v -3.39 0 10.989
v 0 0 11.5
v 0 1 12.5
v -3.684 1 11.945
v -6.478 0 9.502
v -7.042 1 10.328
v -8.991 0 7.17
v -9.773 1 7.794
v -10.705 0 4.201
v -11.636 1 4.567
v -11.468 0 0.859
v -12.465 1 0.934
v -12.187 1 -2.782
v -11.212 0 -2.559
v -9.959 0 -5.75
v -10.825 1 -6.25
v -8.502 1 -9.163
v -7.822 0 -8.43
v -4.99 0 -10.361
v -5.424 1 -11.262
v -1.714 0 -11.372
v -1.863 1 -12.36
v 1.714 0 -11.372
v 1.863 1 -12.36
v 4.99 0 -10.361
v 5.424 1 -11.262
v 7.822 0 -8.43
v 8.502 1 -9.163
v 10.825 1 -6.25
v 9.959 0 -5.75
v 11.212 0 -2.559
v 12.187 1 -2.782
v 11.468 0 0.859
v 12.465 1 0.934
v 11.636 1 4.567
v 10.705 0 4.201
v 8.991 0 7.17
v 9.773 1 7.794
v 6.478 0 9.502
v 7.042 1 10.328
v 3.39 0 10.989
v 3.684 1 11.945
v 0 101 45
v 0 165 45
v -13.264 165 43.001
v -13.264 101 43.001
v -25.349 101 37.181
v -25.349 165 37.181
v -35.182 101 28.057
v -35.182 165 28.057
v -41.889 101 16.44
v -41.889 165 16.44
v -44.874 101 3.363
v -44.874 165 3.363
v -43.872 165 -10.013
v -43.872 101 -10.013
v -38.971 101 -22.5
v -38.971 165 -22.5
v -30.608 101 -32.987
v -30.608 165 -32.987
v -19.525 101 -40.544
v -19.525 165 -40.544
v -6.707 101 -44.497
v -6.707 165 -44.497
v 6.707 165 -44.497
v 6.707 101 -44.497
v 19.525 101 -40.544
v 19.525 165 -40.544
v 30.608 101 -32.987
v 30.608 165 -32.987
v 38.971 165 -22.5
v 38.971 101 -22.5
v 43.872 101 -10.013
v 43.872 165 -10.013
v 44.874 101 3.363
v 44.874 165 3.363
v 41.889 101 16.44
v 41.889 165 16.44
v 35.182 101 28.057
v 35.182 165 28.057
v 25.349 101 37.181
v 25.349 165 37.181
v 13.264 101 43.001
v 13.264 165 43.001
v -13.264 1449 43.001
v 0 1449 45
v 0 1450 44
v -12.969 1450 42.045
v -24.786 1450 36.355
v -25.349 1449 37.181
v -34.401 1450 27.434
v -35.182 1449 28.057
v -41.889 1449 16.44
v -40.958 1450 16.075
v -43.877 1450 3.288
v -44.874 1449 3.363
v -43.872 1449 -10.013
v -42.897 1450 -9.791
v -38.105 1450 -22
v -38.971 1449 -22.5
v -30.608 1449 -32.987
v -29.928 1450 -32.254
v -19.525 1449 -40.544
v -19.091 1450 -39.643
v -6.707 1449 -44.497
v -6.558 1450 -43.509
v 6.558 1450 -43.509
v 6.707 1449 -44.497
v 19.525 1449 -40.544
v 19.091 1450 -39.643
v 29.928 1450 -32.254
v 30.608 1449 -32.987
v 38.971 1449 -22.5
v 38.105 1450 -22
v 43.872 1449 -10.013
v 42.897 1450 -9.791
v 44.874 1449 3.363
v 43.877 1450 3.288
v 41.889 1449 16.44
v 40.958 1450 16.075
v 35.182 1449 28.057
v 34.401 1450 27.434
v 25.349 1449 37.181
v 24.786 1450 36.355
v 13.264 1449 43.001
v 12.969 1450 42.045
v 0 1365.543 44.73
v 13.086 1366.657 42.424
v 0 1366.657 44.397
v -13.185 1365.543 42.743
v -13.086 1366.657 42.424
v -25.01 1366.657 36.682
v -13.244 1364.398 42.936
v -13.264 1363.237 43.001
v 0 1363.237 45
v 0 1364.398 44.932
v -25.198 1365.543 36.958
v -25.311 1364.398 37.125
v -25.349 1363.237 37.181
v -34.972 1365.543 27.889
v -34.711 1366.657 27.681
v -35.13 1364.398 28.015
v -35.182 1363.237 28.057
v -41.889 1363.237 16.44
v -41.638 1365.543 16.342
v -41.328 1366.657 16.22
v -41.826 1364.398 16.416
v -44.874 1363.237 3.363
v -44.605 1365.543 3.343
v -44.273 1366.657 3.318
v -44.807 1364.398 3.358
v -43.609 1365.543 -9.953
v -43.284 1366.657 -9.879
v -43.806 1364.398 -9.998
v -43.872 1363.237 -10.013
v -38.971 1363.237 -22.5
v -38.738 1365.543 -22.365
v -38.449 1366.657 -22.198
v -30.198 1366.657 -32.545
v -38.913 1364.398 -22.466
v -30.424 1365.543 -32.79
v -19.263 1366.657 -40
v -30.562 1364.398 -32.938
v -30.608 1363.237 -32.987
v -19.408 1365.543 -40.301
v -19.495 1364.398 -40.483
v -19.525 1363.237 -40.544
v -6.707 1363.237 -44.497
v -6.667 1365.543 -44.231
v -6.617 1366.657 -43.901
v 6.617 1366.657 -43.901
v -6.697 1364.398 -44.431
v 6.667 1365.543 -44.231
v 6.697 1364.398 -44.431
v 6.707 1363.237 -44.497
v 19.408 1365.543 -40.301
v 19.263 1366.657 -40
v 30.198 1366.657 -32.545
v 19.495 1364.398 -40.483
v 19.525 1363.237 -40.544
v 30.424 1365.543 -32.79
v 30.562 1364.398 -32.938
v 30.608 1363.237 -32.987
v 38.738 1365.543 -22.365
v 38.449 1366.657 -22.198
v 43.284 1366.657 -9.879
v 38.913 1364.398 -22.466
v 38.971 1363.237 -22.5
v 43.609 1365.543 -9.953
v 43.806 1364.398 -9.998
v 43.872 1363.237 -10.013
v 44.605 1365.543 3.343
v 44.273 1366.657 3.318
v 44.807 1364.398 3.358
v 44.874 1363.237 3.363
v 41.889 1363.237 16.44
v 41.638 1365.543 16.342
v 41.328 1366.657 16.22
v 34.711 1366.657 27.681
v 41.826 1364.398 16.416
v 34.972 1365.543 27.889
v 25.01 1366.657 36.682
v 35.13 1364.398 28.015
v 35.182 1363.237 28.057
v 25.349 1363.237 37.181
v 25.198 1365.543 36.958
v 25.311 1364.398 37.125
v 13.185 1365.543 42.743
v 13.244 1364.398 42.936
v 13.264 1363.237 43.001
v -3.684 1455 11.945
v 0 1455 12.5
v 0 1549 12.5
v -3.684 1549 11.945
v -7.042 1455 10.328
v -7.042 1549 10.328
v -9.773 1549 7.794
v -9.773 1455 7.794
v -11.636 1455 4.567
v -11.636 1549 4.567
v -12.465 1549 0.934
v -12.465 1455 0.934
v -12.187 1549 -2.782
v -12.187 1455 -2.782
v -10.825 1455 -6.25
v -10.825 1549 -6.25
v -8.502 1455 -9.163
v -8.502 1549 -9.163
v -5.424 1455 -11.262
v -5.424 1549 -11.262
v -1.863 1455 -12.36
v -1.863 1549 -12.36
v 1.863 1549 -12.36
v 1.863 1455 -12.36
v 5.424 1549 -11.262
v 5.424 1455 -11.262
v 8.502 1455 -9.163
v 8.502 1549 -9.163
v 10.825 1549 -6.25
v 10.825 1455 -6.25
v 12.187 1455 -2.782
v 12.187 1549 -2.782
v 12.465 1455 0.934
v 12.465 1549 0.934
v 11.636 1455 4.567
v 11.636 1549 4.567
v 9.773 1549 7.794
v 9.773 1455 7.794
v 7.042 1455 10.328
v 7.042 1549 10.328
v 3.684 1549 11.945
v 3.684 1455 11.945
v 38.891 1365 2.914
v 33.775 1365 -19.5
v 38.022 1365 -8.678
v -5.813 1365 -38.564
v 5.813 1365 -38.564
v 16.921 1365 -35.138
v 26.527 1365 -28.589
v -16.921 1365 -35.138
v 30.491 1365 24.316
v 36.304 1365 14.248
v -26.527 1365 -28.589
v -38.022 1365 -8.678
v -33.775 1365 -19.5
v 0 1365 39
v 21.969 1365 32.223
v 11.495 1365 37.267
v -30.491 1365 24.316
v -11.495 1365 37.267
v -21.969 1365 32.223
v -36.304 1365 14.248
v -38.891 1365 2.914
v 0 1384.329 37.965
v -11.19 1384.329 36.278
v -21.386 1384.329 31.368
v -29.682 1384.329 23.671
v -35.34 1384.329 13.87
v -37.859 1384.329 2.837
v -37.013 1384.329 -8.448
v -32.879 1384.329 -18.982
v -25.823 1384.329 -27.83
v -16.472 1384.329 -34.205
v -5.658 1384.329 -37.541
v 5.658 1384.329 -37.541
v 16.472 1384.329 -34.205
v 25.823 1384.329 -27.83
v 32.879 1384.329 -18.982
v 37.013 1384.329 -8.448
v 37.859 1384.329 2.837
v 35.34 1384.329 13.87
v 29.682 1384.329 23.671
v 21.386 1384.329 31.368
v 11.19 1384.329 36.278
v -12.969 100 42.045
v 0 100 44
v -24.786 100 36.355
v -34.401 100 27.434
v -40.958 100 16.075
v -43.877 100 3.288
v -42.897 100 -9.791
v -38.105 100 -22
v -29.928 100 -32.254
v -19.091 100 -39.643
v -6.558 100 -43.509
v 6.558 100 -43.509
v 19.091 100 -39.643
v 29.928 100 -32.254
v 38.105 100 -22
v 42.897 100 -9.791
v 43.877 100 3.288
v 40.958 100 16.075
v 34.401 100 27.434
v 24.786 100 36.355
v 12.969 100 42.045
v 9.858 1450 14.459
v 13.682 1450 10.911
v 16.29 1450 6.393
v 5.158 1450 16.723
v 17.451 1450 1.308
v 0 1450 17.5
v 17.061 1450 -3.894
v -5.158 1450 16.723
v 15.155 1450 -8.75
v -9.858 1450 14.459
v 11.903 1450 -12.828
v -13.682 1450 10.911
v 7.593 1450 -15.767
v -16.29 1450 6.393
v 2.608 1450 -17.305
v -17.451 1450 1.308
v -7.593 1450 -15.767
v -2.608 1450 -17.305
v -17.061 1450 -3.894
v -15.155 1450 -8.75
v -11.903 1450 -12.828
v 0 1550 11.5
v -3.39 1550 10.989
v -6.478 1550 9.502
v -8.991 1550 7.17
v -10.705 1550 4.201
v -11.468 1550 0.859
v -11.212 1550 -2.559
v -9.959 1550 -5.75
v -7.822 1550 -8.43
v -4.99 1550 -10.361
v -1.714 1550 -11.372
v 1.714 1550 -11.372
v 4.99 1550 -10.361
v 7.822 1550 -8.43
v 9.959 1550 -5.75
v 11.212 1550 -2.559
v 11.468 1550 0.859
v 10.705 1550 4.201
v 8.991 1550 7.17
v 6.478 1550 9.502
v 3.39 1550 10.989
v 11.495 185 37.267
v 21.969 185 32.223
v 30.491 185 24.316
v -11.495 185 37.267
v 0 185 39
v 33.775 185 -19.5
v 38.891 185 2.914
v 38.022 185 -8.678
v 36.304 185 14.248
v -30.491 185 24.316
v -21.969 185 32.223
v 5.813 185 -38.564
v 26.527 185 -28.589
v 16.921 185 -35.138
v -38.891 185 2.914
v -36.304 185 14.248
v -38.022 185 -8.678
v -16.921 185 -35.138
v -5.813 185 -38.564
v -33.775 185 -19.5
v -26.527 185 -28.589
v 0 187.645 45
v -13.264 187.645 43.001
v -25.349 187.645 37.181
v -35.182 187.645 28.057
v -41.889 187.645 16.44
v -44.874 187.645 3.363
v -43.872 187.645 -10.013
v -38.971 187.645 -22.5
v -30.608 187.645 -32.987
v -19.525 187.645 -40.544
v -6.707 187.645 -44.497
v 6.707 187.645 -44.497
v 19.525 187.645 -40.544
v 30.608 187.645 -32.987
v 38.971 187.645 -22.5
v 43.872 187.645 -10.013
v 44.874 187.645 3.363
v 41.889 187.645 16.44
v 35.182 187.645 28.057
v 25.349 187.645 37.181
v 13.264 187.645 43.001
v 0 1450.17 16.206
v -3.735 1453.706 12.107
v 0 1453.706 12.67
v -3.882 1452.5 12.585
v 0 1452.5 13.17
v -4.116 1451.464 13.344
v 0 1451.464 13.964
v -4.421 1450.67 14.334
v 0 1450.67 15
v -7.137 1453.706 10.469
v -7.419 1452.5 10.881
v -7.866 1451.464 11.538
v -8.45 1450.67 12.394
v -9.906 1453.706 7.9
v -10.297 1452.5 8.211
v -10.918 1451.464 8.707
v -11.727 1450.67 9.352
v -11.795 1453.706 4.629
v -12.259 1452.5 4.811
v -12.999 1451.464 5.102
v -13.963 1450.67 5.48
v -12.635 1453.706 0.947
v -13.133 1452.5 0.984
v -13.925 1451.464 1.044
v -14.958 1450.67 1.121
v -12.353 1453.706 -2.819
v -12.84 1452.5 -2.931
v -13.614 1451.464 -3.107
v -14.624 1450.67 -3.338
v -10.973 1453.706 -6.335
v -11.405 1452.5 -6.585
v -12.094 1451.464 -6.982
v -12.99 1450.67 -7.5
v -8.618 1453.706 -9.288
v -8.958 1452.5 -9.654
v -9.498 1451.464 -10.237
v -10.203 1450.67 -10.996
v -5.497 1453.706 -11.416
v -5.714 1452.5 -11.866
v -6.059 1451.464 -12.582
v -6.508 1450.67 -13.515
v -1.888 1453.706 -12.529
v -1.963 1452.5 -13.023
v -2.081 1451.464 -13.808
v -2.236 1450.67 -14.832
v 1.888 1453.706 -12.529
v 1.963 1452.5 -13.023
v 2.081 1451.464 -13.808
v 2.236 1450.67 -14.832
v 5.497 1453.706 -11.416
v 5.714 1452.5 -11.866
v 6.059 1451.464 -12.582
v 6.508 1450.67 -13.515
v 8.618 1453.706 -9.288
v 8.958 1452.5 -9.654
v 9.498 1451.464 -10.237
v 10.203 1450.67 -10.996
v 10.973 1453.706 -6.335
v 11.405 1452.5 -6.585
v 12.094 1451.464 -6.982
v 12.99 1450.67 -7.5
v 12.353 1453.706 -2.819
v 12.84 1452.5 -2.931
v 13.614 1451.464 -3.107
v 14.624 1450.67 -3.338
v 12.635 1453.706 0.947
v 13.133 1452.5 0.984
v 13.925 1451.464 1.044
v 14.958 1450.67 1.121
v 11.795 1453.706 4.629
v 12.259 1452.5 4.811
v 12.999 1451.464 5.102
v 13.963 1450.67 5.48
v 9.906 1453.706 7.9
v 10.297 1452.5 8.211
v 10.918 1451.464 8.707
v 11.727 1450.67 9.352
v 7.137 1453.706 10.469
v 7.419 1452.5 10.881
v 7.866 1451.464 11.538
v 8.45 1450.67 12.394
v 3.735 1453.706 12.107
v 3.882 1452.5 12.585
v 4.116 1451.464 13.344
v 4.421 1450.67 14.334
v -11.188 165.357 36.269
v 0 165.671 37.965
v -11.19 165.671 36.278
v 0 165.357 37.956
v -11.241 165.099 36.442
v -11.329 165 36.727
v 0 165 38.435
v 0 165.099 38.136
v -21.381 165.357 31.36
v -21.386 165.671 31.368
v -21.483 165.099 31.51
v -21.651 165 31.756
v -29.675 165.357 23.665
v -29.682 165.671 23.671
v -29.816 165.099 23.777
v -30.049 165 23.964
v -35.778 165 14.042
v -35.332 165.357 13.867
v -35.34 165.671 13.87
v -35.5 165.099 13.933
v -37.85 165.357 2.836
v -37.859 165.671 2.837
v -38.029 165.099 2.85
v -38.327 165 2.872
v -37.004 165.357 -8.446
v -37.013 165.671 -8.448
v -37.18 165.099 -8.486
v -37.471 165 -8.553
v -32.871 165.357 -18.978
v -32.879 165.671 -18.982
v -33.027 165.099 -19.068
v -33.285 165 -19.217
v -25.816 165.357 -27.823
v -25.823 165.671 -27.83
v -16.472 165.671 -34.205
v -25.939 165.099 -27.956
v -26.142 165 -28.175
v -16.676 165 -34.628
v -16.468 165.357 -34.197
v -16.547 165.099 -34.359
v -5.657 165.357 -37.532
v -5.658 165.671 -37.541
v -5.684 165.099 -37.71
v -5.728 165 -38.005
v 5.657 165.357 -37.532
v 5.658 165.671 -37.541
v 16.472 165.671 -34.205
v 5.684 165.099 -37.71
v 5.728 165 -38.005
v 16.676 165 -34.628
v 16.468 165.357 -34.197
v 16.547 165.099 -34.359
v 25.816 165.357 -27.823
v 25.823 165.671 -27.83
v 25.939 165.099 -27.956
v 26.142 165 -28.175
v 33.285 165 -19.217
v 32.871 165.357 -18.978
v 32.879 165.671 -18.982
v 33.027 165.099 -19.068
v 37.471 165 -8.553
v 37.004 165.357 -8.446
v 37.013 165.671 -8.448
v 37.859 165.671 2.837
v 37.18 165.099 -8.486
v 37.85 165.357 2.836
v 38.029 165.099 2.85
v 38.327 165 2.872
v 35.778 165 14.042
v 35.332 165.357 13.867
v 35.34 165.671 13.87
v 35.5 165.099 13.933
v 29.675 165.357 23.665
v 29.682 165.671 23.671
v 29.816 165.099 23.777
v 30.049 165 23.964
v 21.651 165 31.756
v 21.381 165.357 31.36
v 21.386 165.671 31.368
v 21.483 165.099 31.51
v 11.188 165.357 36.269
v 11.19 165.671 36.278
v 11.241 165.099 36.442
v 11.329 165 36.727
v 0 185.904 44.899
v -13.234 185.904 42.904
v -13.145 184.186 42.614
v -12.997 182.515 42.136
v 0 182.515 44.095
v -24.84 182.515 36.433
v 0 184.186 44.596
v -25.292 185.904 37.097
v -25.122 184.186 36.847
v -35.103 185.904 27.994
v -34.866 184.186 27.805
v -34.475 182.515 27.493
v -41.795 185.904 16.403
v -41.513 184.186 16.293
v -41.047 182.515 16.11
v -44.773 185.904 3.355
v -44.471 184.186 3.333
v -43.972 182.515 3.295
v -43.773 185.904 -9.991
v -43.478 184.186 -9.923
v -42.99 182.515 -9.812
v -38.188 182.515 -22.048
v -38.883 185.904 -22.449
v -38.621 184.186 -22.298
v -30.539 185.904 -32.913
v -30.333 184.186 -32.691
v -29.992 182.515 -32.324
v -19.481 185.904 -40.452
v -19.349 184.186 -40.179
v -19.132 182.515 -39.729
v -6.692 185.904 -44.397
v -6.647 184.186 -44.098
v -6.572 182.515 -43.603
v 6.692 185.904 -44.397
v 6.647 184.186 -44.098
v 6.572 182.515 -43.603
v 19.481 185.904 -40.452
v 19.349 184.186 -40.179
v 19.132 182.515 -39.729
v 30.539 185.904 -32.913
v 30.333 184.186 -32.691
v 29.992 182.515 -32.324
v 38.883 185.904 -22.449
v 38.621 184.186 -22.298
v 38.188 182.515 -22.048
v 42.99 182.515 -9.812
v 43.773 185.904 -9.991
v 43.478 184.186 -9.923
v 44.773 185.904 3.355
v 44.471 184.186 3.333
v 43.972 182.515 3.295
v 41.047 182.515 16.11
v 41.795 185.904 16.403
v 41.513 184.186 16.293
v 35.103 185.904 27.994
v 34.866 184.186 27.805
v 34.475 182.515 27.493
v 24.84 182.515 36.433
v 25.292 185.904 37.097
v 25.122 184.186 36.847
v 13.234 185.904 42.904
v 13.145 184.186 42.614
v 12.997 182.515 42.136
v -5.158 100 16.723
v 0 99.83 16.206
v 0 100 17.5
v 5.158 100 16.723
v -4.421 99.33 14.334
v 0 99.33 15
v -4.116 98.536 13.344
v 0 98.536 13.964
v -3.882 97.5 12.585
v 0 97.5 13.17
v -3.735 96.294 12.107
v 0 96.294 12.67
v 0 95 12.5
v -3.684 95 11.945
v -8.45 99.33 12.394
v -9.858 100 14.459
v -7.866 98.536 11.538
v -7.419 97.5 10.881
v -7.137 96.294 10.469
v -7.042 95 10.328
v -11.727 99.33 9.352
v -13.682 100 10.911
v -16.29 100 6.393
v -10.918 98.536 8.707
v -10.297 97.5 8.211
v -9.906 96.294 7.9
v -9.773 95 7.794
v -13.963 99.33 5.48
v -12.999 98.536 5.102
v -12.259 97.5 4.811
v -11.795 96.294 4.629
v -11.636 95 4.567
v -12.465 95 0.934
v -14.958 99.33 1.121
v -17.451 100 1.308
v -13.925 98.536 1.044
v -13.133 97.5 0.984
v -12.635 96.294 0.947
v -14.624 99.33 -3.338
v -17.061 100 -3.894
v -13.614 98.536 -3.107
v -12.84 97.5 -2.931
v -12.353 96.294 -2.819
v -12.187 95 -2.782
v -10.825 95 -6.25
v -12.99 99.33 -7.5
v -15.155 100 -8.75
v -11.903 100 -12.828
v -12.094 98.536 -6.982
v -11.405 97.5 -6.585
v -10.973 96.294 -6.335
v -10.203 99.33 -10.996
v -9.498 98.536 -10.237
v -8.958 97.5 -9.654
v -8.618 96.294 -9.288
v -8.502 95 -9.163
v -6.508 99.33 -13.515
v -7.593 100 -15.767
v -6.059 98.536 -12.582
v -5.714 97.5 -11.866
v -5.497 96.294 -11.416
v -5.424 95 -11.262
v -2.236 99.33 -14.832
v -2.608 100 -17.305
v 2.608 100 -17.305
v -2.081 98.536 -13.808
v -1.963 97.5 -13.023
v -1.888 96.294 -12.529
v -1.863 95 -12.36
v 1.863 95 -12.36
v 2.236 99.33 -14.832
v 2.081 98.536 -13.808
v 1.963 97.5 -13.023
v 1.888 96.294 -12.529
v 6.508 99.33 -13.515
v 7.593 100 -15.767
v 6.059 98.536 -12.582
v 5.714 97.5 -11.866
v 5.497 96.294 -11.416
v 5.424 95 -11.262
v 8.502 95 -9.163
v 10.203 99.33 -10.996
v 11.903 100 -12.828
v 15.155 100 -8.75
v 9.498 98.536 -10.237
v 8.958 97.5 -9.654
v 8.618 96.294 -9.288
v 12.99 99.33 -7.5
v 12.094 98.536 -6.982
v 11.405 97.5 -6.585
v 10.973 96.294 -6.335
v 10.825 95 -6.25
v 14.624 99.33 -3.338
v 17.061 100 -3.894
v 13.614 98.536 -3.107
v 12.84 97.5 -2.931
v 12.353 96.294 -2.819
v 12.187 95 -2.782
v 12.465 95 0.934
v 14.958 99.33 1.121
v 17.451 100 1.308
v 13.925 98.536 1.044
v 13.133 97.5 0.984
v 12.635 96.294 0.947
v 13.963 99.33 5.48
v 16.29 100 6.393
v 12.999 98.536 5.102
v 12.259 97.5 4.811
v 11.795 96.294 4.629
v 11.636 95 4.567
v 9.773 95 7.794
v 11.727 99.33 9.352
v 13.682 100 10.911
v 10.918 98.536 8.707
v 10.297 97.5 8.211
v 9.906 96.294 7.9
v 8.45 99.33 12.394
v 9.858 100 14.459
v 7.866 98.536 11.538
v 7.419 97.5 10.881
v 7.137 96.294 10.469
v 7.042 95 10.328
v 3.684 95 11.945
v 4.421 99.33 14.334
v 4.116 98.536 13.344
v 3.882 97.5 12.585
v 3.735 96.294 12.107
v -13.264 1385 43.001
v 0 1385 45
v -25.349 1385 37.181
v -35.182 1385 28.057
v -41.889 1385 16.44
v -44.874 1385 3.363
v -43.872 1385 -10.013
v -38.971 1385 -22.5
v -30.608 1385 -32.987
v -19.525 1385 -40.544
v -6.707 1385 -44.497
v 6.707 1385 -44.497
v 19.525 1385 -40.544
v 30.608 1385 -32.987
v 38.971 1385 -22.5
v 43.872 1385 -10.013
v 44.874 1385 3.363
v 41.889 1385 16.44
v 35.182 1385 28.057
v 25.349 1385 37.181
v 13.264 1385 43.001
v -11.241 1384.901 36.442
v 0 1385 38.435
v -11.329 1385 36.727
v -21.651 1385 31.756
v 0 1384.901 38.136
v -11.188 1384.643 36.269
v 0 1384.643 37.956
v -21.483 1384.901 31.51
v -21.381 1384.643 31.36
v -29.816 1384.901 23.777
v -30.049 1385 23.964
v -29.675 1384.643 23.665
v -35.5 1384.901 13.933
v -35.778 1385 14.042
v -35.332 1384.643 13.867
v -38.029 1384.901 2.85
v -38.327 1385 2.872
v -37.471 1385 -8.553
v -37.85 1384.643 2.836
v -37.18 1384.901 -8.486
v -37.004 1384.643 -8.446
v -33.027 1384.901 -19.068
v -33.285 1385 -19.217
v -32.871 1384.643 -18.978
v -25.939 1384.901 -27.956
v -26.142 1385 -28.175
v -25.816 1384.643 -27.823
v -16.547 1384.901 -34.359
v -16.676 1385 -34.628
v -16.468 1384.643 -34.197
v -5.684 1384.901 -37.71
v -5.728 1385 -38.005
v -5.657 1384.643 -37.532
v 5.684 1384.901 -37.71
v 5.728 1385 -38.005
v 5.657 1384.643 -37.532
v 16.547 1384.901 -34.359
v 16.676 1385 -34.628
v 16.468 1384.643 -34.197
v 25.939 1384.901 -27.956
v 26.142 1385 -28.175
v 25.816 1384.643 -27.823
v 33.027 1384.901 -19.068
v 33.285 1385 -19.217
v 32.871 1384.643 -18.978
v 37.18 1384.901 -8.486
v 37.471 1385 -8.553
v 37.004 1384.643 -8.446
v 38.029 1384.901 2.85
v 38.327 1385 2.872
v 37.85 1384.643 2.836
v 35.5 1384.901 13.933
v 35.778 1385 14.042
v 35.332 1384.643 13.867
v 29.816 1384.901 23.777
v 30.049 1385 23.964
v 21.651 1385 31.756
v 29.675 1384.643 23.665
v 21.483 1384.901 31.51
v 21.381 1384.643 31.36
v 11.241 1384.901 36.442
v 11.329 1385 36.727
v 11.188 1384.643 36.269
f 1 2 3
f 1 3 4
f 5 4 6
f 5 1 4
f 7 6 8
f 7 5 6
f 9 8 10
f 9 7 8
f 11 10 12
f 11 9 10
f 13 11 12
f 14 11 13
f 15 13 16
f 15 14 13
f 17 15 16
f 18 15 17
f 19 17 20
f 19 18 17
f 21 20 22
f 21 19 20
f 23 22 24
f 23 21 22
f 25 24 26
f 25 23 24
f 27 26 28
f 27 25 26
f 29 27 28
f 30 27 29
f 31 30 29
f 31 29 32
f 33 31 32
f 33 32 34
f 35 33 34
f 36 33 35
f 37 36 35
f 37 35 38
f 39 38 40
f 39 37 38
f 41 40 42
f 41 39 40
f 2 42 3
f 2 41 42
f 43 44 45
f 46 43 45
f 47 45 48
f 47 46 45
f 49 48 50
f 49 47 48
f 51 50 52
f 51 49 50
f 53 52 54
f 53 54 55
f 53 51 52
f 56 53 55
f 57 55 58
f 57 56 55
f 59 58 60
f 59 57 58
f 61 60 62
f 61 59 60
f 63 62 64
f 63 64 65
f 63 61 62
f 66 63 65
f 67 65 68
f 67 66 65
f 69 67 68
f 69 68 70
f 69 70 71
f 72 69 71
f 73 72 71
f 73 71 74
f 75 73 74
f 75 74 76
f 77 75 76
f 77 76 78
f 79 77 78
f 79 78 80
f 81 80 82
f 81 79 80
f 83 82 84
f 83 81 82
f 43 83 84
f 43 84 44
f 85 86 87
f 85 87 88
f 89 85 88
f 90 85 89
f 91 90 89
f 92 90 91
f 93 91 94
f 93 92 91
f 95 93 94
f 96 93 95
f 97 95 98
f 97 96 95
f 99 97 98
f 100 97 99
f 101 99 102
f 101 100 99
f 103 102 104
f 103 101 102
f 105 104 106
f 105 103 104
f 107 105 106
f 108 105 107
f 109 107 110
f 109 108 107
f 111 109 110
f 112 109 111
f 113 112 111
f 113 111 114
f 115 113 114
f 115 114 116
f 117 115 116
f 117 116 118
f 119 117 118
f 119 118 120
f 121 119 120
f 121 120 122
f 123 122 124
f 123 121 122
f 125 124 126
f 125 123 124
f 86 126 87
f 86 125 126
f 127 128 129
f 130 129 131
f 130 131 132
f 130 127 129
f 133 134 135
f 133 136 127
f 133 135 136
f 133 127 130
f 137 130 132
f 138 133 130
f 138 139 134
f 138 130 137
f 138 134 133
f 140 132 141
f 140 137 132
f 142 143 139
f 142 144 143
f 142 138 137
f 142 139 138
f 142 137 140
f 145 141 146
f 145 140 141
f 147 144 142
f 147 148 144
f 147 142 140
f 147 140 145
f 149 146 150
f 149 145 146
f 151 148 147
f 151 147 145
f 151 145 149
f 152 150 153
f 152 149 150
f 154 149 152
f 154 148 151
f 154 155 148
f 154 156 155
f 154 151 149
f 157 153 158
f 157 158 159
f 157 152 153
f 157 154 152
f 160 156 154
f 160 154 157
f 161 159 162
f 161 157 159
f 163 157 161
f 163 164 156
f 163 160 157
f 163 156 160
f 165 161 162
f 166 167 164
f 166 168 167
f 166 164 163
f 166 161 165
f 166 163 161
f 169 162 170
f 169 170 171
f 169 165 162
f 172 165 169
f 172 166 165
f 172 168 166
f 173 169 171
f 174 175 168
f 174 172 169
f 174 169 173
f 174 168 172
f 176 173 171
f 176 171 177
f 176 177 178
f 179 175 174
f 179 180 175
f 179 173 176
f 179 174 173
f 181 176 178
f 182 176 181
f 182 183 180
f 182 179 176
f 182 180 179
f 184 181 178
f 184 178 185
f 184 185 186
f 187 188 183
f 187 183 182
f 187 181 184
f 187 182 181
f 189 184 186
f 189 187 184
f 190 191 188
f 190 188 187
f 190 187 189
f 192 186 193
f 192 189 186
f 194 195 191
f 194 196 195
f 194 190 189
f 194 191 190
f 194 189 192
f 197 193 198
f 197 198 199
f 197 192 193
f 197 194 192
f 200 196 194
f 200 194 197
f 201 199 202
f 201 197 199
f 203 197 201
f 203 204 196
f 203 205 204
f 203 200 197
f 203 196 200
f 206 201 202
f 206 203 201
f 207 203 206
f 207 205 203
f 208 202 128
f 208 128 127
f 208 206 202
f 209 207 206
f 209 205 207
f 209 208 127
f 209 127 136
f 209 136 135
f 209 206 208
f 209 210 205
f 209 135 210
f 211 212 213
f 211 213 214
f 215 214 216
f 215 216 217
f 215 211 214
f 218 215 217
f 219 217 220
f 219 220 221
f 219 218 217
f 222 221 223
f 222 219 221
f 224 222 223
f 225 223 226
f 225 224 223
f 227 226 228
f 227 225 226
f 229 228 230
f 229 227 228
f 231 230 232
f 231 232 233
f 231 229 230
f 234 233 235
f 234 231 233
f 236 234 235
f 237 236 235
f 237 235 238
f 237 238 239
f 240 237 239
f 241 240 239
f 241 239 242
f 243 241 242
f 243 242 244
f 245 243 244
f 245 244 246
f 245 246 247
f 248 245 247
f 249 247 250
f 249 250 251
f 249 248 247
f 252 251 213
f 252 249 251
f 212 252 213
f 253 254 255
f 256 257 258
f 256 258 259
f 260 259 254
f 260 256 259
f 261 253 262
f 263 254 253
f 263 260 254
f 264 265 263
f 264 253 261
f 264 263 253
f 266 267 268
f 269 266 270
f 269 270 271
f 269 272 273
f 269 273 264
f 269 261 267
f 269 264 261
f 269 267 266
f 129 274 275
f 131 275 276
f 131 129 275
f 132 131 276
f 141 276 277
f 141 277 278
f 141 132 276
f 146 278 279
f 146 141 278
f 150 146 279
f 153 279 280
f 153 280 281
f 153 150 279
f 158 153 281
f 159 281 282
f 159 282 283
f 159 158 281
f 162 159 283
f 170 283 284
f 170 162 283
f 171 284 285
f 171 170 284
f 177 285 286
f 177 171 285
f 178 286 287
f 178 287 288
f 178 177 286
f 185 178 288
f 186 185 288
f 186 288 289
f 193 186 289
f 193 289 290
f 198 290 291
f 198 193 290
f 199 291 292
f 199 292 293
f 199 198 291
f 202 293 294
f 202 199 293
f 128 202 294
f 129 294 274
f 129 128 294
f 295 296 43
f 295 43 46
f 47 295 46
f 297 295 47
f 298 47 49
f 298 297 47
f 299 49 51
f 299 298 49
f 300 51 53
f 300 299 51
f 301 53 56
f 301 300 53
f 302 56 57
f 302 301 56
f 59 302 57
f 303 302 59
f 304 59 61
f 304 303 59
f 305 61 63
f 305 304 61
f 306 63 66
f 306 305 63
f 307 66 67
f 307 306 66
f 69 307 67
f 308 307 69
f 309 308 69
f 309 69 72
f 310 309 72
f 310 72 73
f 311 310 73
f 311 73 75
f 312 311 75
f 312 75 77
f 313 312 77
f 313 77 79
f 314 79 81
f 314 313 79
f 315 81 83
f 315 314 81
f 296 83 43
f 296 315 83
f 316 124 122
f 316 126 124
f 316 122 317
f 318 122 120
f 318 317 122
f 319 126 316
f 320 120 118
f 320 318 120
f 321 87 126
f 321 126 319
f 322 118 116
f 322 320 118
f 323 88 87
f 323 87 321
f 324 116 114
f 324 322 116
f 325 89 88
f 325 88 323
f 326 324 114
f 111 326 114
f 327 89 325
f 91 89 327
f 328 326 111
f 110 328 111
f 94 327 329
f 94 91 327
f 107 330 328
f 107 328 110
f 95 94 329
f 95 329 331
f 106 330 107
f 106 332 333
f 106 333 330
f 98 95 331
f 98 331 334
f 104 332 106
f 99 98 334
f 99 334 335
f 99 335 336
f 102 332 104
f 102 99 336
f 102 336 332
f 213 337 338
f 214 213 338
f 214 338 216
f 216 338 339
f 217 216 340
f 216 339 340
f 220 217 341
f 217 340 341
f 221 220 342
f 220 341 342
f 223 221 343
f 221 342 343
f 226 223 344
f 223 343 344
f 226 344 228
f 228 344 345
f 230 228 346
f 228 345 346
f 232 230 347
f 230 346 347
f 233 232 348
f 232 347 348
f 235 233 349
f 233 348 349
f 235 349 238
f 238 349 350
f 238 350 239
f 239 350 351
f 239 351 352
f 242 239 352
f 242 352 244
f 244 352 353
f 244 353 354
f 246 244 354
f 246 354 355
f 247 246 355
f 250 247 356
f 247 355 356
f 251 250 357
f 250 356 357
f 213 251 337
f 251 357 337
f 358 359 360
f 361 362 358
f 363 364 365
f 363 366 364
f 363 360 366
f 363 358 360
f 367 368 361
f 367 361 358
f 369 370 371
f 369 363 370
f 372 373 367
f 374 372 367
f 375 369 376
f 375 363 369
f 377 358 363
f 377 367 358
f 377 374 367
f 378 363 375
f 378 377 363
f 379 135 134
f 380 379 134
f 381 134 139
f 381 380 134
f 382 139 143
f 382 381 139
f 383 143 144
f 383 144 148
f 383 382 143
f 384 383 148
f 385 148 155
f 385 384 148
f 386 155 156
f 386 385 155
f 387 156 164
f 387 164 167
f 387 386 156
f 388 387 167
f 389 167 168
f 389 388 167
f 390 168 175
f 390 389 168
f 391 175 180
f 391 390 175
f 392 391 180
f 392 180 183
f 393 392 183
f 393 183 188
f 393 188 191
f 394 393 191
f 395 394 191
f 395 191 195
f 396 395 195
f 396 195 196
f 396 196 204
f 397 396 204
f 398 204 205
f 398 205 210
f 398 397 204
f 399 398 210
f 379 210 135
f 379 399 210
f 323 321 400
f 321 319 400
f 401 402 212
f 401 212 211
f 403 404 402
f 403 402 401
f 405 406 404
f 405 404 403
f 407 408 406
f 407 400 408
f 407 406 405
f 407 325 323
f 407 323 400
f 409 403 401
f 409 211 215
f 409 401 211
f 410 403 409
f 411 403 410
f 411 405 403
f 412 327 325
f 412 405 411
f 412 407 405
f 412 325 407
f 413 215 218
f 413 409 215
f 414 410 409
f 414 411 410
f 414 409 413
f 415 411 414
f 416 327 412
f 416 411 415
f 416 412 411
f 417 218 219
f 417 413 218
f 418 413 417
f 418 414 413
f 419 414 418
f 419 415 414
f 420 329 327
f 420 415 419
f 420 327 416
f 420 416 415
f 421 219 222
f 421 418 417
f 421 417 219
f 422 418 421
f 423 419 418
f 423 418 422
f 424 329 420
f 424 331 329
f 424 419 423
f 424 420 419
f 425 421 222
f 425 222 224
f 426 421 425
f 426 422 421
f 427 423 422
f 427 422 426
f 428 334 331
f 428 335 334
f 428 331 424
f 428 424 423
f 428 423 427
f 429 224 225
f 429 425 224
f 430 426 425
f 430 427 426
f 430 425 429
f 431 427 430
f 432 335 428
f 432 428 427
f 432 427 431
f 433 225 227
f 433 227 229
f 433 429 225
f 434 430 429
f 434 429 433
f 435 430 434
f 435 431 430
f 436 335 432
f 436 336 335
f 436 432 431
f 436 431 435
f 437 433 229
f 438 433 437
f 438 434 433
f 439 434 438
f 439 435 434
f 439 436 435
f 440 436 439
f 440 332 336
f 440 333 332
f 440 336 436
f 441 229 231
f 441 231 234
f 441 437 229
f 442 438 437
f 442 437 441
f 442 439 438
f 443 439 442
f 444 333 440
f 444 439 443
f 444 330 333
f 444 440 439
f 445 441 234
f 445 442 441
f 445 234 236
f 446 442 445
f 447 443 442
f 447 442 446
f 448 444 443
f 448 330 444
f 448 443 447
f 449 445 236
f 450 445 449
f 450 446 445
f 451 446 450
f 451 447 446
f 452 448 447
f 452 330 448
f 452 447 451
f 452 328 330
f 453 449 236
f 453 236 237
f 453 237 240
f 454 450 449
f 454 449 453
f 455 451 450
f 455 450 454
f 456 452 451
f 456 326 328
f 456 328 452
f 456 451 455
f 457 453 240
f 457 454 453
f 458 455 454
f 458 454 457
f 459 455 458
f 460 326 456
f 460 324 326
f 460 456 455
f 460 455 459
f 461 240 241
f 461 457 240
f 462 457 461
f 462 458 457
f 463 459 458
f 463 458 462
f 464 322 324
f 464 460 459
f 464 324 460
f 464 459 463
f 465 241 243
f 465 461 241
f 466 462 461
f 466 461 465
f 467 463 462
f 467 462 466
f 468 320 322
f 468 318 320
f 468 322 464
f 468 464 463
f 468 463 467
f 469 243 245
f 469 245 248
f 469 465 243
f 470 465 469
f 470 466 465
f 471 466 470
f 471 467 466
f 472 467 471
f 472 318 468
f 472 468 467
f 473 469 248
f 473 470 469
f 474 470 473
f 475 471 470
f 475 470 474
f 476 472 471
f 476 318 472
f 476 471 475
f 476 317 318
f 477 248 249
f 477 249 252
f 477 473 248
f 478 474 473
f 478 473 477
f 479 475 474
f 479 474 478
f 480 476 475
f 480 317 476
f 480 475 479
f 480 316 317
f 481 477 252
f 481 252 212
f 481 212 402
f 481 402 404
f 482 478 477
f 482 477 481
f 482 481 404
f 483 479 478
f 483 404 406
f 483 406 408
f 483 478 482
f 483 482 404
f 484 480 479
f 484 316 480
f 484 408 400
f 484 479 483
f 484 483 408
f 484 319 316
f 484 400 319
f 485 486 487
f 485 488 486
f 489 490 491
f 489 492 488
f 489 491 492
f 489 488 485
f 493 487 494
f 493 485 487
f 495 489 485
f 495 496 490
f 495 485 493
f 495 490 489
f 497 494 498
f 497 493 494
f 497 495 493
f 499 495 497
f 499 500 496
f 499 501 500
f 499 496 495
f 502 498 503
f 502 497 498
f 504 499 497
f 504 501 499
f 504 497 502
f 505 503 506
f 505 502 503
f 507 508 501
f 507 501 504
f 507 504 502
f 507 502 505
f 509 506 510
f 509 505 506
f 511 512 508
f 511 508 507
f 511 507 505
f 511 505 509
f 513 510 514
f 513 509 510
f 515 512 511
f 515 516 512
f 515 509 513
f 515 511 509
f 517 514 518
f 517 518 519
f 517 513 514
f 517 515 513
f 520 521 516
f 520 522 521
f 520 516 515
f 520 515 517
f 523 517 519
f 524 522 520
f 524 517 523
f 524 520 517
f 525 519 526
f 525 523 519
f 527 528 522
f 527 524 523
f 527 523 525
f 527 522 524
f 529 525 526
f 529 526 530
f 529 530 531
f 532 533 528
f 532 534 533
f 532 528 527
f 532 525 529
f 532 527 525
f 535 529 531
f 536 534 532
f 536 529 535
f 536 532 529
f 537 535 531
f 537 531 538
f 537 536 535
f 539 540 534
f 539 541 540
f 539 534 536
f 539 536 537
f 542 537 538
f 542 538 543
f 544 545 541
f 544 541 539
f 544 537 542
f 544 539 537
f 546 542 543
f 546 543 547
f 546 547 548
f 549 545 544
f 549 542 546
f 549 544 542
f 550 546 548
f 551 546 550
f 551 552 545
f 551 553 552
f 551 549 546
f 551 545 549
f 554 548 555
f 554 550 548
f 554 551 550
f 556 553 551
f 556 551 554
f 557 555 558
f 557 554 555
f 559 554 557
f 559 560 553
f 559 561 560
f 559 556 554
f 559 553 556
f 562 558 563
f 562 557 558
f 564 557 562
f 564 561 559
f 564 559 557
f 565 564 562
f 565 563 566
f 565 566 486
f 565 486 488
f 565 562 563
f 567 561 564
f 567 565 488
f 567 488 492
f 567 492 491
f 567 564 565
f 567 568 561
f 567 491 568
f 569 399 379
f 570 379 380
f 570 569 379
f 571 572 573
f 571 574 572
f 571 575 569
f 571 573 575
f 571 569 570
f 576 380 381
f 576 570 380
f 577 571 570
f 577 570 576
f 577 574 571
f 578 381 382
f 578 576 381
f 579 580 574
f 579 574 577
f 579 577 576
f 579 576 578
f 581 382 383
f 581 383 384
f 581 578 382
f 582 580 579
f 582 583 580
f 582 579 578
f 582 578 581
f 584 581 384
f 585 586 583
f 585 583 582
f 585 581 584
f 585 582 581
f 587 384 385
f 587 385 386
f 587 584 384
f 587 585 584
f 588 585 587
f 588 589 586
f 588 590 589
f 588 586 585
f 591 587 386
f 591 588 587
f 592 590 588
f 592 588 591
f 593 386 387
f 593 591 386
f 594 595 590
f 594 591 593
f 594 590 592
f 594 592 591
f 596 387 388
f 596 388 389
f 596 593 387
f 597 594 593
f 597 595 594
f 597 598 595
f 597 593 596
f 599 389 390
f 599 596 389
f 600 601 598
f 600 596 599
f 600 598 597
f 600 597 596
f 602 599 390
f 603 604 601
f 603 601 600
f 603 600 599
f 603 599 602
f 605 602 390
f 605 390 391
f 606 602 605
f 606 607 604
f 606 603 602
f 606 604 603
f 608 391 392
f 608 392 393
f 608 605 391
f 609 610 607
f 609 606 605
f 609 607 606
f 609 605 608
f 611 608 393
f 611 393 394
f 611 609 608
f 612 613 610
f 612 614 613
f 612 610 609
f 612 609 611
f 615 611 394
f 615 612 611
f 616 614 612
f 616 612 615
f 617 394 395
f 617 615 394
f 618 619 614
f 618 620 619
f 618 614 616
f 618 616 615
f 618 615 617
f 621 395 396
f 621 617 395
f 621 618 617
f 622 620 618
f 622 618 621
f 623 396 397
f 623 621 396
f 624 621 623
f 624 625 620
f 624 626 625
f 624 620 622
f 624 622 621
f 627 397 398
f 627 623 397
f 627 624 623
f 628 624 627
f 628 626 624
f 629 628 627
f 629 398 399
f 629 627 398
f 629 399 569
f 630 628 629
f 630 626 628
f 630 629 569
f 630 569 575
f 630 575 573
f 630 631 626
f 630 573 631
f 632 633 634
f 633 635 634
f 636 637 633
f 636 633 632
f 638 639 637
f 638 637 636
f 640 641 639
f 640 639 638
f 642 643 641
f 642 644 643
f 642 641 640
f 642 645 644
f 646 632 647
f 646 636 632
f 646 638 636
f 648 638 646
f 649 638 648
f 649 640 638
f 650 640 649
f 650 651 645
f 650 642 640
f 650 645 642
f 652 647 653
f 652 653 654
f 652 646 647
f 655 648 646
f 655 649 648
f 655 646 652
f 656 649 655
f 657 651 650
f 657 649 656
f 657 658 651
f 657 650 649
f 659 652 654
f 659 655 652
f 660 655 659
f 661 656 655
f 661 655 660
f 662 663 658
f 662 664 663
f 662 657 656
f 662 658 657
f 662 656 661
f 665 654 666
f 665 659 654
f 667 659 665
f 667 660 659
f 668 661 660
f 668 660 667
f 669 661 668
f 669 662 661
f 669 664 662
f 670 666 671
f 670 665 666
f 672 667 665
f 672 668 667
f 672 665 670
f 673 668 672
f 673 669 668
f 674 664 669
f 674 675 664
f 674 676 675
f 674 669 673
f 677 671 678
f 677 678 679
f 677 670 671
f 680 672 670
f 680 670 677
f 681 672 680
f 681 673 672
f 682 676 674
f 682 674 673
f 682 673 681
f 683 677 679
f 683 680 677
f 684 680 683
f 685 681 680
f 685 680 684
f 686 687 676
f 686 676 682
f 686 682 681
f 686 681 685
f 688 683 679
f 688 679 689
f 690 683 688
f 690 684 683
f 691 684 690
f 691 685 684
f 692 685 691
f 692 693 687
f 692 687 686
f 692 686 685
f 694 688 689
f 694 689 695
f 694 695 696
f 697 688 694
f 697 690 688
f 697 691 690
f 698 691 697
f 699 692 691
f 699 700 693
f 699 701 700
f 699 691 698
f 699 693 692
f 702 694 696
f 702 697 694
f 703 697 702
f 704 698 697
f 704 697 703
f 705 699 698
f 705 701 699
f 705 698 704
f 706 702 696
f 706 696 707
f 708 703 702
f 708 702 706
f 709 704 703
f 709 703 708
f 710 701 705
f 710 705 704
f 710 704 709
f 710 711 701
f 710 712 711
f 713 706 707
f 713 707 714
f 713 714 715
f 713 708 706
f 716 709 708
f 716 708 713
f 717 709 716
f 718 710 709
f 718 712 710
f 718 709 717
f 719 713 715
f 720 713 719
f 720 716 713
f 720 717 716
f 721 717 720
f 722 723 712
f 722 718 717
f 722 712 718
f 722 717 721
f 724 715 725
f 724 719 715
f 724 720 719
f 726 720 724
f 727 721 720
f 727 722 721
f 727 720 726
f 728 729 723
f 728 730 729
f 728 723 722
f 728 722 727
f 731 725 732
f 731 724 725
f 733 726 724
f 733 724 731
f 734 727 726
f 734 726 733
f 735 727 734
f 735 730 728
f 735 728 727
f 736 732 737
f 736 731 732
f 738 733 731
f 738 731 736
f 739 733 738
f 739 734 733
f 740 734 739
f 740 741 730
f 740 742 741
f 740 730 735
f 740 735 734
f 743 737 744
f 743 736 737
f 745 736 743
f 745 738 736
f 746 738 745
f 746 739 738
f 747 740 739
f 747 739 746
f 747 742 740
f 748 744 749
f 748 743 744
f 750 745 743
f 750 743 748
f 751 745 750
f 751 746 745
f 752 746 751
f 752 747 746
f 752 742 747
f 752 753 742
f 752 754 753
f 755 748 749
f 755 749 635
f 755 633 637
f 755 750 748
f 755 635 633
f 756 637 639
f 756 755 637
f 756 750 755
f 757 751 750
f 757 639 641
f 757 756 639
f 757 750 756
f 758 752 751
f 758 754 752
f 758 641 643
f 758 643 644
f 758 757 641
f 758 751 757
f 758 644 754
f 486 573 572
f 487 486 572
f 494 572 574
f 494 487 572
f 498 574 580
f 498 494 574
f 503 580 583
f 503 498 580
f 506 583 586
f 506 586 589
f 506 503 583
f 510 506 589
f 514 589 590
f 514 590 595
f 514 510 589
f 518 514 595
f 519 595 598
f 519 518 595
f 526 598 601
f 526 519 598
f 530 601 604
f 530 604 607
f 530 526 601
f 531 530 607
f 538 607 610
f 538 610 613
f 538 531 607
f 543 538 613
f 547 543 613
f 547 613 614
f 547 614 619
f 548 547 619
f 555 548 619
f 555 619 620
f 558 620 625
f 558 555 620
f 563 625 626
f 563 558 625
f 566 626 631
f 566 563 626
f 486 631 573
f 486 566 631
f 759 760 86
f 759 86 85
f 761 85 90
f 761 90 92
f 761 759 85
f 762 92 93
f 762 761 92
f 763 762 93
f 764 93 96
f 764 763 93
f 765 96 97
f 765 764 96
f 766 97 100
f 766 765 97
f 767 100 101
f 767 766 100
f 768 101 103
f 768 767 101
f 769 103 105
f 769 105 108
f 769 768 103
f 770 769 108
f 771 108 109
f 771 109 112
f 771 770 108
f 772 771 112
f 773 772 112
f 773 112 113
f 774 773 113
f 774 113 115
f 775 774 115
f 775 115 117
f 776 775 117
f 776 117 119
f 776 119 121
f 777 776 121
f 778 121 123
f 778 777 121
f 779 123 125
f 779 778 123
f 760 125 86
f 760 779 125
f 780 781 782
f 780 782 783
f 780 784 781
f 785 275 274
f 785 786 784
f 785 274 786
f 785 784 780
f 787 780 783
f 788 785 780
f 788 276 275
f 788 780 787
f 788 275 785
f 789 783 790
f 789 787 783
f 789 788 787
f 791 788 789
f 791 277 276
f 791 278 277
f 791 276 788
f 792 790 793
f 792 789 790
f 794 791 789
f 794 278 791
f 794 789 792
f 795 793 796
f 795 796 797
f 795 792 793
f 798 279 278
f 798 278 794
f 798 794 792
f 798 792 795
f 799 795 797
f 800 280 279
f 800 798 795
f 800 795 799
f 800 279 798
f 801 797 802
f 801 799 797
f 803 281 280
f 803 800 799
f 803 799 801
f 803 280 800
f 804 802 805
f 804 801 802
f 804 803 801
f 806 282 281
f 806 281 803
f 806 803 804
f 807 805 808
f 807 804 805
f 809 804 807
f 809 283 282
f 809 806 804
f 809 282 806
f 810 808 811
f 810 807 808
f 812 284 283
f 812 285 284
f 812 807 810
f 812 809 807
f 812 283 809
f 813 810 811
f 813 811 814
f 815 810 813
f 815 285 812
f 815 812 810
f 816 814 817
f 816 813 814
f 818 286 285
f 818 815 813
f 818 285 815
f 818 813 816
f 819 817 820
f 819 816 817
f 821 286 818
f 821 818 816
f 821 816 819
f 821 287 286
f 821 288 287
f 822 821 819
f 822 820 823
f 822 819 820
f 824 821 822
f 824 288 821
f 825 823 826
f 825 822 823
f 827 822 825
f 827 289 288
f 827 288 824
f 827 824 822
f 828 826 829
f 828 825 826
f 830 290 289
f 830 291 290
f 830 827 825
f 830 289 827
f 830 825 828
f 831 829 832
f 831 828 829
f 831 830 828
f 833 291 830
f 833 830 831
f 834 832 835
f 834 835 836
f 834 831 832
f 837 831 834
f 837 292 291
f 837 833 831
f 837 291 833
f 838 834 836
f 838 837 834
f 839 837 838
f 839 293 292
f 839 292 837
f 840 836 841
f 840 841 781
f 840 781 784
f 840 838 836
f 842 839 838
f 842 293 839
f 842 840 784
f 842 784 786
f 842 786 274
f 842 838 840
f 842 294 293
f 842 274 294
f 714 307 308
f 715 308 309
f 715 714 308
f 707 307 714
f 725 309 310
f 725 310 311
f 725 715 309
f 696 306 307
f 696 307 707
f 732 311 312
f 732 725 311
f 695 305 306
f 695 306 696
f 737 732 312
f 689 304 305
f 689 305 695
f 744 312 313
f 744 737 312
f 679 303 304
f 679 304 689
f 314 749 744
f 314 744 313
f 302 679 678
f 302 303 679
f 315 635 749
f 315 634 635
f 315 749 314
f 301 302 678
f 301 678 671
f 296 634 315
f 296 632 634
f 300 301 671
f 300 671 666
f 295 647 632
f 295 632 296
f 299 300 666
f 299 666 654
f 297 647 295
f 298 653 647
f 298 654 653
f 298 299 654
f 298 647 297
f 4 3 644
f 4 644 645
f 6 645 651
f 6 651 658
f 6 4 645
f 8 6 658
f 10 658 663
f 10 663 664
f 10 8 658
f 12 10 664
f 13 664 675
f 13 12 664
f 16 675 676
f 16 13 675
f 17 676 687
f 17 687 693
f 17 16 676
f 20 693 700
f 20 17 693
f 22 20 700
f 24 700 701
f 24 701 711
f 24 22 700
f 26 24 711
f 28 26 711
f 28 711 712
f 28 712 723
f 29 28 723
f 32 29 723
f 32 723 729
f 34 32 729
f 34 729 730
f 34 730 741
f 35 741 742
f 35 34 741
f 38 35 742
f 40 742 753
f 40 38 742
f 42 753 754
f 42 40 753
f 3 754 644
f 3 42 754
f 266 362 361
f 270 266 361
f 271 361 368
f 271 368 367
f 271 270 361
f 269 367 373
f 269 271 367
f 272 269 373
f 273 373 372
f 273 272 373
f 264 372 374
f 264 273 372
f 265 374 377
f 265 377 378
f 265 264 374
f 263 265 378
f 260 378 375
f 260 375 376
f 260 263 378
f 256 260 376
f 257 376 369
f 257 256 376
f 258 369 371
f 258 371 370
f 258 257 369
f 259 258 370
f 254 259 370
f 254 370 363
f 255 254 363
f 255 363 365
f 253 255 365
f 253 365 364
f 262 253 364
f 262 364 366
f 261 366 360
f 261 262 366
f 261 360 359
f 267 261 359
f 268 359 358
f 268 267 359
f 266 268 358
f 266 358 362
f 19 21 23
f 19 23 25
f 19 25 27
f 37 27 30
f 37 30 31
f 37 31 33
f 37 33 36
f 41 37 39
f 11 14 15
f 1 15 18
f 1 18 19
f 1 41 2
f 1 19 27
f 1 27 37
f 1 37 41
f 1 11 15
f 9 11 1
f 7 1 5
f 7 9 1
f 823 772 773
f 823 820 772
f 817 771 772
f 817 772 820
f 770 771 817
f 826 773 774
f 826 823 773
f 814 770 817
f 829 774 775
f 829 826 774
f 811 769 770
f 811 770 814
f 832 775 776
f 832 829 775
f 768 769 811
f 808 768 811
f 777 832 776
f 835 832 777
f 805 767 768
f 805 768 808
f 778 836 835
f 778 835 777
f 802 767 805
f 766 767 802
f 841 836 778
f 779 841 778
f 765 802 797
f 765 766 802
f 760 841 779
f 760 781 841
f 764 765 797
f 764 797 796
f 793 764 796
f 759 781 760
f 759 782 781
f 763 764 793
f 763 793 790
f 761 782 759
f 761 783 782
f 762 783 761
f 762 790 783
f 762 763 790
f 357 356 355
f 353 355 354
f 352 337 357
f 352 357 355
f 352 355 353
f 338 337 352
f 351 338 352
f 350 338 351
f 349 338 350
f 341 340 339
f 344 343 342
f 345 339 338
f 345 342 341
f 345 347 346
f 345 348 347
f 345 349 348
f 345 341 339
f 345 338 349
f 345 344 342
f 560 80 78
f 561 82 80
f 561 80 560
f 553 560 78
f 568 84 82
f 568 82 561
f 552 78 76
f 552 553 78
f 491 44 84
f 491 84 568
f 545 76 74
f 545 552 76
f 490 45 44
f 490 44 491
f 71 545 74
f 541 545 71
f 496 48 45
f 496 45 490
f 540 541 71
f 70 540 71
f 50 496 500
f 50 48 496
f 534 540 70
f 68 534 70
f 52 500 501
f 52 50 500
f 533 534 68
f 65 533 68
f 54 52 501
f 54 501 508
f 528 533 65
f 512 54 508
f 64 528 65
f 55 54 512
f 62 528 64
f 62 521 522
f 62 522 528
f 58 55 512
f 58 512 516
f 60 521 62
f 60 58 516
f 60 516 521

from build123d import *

# Parameters (mm, degrees)
F2_R    = 5
F3_SIZE = 1


with BuildPart() as f1:
    # F0 (on Right) → F1 (revolve)
    with BuildSketch(Plane.YZ):
        with BuildLine():
            Line((0, 12.5), (0, 0))
            Line((0, 0), (185, 0))
            Line((185, 0), (185, 39))
            Line((185, 39), (1365, 39))
            Line((1365, 39), (1365, 0))
            Line((1365, 0), (1550, 0))
            Line((1550, 0), (1550, 12.5))
            Line((1550, 12.5), (1450, 12.5))
            Line((1450, 12.5), (1450, 45))
            Line((1450, 45), (1385, 45))
            Line((1385, 45), (1385, 38.434669))
            ThreePointArc((1385, 38.434669), (1384.786788, 38.025093), (1384.32899, 37.964823))
            Line((1384.32899, 37.964823), (1366.656932, 44.396926))
            ThreePointArc((1366.656932, 44.396926), (1364.973212, 44.848078), (1363.23673, 45))
            Line((1363.23673, 45), (187.644905, 45))
            ThreePointArc((187.644905, 45), (185.040182, 44.772116), (182.514603, 44.095389))
            Line((182.514603, 44.095389), (165.67101, 37.964823))
            ThreePointArc((165.67101, 37.964823), (165.213212, 38.025093), (165, 38.434669))
            Line((165, 38.434669), (165, 45))
            Line((165, 45), (100, 45))
            Line((100, 45), (100, 12.5))
            Line((100, 12.5), (0, 12.5))
        make_face()
    revolve(axis=Axis((0, 1457.5, 0), (0, -1, 0)))

    # F2
    f2_edges = [f1.edges().sort_by_distance(p)[0] for p in [
        (0, 1450, -12.5),
        (0, 100, -12.5),
    ]]
    fillet(f2_edges, radius=F2_R)

    # F3
    f3_edges = [f1.edges().sort_by_distance(p)[0] for p in [
        (0, 1450, -45),
        (0, 1550, -12.5),
        (0, 0, -12.5),
        (0, 100, -45),
    ]]
    chamfer(f3_edges, length=F3_SIZE)


solid = f1.part
